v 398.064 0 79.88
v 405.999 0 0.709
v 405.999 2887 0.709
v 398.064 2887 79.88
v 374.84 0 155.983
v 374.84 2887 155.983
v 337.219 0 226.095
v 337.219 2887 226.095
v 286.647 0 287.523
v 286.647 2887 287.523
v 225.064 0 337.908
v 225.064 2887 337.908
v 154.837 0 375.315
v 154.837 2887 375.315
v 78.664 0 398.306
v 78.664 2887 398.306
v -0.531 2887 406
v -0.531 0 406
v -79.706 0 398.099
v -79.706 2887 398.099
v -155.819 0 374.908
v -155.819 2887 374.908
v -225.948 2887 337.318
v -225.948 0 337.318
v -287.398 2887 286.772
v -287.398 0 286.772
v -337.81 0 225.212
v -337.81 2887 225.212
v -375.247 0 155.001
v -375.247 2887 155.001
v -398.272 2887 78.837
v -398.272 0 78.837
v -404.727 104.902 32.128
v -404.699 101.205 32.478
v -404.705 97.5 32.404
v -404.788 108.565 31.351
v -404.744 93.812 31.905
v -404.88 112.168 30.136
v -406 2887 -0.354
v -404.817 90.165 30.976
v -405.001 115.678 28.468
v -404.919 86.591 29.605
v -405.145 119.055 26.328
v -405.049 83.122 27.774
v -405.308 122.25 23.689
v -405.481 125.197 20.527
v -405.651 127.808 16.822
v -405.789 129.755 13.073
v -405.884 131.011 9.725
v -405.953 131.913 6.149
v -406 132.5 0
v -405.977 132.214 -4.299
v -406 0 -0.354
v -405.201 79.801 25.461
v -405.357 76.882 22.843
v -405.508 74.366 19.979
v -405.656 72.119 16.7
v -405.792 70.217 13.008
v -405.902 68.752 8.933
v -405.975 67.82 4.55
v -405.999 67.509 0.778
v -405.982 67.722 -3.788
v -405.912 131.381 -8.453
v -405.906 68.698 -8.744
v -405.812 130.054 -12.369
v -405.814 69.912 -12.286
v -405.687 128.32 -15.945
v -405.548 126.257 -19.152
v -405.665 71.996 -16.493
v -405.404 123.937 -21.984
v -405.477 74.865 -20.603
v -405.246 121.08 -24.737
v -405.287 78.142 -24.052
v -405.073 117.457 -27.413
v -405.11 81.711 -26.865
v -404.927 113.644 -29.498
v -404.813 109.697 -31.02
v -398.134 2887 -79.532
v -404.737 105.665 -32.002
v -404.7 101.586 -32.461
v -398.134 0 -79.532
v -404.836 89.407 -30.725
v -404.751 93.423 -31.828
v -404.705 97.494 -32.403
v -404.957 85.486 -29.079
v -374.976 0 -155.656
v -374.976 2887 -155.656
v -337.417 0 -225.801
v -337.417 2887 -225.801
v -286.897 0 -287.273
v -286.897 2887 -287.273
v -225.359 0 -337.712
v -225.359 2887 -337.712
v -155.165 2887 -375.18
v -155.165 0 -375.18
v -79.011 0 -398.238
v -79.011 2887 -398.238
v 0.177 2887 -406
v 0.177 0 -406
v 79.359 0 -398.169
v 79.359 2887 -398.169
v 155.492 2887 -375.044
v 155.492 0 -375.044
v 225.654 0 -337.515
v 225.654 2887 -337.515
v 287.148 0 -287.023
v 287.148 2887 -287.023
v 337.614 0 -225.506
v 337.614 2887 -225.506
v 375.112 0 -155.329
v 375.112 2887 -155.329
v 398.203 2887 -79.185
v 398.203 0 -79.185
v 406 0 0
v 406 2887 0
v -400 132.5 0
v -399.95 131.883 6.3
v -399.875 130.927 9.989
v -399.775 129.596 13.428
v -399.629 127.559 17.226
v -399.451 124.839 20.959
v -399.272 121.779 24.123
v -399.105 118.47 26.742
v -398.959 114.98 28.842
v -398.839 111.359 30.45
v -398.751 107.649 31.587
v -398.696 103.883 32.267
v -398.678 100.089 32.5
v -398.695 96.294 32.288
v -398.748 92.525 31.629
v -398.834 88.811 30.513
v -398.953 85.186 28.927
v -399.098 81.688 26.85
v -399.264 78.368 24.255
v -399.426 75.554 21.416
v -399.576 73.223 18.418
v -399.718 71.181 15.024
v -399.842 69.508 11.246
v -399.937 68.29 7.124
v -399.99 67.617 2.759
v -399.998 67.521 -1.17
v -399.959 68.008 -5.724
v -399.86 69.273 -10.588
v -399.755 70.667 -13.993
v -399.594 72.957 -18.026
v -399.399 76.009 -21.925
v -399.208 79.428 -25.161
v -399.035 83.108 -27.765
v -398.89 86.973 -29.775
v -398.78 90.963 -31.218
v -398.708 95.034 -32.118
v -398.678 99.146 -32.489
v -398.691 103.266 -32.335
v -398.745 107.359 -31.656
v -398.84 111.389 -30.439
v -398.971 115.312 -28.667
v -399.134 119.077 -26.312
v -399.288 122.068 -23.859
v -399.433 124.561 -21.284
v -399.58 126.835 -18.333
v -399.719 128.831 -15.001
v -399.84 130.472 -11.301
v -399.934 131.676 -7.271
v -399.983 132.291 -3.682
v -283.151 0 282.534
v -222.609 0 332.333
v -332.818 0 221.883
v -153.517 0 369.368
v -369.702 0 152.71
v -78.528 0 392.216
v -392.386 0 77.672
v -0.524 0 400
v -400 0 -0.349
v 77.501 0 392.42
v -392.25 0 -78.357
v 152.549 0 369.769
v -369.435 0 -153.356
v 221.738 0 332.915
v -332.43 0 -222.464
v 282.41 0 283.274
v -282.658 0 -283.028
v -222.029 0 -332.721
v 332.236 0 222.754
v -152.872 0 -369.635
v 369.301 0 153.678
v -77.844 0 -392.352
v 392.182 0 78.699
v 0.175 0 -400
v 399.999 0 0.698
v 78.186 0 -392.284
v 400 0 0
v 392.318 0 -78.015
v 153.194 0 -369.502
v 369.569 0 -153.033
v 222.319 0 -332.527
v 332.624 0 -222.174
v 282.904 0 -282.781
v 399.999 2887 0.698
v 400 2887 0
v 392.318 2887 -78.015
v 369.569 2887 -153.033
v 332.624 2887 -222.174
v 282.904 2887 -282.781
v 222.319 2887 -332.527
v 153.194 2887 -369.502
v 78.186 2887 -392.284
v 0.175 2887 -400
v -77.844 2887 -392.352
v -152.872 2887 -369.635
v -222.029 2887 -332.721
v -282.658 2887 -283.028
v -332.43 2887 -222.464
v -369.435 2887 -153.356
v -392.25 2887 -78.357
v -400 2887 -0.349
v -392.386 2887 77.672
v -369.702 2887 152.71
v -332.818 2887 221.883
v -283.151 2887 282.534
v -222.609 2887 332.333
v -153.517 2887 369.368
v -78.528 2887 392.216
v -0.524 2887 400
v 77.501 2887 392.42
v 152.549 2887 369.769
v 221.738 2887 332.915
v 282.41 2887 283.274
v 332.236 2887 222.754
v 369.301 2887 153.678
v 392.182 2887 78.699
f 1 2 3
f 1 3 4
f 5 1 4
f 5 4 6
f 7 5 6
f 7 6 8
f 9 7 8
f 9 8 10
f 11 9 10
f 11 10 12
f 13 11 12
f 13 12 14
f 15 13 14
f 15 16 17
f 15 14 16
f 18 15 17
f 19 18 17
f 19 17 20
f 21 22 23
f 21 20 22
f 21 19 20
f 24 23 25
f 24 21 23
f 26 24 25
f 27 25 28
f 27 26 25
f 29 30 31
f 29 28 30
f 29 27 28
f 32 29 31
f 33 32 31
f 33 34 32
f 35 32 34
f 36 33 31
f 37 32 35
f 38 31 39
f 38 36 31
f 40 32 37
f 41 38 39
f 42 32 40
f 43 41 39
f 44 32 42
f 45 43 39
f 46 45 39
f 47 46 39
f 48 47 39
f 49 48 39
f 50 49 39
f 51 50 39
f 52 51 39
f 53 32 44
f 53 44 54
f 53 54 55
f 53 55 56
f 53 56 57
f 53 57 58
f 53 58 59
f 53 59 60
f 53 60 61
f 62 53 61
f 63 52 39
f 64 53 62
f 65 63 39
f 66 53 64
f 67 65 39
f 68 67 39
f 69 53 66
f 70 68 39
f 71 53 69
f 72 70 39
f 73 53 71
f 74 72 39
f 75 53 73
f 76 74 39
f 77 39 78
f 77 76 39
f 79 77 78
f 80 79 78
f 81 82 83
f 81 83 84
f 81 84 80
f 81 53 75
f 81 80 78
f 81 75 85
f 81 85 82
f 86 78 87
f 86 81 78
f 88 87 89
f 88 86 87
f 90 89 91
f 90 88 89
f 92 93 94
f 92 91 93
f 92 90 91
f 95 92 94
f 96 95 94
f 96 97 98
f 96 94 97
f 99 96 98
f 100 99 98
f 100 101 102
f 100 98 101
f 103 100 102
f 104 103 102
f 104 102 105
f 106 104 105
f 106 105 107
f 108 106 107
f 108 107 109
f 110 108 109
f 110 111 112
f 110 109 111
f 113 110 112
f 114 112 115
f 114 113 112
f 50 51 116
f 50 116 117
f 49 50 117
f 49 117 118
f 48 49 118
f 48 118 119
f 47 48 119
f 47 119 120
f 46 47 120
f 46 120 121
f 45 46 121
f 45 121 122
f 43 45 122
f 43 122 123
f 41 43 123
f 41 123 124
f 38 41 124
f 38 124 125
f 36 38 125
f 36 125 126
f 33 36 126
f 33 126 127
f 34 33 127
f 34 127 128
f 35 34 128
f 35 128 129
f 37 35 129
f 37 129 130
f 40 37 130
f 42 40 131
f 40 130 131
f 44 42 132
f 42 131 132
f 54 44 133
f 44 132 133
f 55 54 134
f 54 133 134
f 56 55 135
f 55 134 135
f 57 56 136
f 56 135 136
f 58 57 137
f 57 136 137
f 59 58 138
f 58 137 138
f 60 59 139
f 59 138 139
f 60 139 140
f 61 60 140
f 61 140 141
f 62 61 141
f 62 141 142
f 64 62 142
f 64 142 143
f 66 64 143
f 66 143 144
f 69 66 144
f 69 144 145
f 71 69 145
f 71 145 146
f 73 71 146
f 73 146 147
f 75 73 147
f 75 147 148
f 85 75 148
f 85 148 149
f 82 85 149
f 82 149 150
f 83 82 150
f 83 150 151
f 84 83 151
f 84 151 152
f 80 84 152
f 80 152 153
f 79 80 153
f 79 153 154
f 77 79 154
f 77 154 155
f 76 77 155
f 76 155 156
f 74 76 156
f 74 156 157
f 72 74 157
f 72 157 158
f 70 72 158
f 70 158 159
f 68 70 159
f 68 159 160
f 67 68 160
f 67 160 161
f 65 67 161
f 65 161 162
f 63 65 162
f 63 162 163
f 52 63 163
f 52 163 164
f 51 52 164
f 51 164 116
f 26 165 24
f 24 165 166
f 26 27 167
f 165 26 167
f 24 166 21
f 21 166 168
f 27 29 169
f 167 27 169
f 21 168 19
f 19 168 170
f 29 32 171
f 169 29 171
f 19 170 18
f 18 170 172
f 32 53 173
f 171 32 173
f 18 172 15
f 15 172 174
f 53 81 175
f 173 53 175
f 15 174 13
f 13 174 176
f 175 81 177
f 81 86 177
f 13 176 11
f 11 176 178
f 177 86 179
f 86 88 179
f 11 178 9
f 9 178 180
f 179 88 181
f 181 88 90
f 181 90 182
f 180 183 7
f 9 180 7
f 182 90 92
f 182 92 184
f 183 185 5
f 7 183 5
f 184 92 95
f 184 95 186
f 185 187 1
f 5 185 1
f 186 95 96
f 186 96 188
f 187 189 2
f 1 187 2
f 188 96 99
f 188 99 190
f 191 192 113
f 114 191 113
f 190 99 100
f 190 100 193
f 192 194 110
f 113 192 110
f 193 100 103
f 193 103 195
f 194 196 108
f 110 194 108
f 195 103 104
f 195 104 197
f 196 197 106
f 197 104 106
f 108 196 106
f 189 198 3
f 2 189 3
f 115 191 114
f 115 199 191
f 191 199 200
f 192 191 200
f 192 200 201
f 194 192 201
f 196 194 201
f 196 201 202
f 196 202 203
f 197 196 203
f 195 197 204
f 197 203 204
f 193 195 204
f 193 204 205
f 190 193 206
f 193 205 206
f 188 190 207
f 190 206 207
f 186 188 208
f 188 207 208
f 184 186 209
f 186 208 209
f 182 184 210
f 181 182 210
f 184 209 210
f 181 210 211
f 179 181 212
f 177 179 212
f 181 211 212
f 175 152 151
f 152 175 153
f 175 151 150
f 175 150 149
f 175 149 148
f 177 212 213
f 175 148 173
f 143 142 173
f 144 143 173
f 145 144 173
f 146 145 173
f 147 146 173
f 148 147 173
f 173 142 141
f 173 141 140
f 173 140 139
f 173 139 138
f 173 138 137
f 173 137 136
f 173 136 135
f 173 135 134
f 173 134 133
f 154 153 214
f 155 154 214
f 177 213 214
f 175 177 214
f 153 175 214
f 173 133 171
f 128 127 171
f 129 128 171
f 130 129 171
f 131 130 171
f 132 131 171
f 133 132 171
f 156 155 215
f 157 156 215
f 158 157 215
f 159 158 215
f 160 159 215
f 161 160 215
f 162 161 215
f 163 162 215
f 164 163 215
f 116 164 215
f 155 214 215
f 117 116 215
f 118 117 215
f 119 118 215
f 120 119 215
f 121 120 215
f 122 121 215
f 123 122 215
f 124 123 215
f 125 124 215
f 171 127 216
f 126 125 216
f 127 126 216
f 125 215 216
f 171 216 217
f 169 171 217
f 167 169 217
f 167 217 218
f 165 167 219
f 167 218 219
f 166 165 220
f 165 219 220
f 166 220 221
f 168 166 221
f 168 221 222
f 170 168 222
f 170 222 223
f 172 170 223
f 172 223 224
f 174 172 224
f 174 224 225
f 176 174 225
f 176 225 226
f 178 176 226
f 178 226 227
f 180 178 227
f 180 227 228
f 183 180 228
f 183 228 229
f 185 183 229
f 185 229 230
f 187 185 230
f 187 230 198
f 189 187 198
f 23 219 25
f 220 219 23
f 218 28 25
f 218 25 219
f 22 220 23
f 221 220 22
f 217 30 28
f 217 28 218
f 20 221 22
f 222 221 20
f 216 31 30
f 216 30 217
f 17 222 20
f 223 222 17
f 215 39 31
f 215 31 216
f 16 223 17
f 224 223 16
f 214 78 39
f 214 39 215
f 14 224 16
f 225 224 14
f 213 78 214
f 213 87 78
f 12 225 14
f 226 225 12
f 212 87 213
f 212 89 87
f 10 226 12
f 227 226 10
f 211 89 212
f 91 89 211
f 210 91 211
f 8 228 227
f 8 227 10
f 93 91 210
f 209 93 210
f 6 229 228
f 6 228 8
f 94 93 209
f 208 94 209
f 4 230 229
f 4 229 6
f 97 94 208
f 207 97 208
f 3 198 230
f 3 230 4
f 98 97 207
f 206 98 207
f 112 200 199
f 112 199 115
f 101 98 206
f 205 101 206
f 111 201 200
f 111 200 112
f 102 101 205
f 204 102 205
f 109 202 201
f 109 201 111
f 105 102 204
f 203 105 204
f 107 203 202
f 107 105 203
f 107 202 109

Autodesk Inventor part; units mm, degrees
ref_plane "YZ Plane" through (0, 0, 0) normal (1, 0, 0) x (0, 1, 0)
ref_plane "XZ Plane" through (0, 0, 0) normal (0, 1, 0) x (-1, 0, 0)
ref_plane "XY Plane" through (0, 0, 0) normal (0, 0, 1) x (1, 0, 0)
sketch "Sketch1" plane through (0, 0, 0) normal (0, 0, 1) x (1, 0, 0)
  line L0 (406, 0) -> (400, 0)
  line L1 (400, 0) -> (400, 2887)
  line L2 (400, 2887) -> (406, 2887)
  line L3 (406, 2887) -> (406, 0)
  line L4 (0, 0) -> (0, 2896.1409)
  point P0 (403, 0)
  dimension "d0" = 6
  dimension "d1" = 2887
  dimension "d2" = 400
revolve "Revolution1" add sketch "Sketch1" angle 359.9 about axis through (0, 0, 0) along (0, 1, 0)
sketch "Sketch2" plane through (0, 0, 0) normal (1, 0, 0) x (0, 1, 0)
  circle A0 centre (100, 0) radius 32.5
  point P0 (0, 0)
  dimension "d4" = 65
  dimension "d5" = 100
extrude "Extrusion1" cut sketch "Sketch2" against normal through all
equation "\"BendReliefWidth\" = Thickness"
equation "\"BendReliefDepth\" = 0.5 * Thickness"
equation "\"CornerReliefSize\" = 4 * Thickness"
equation "\"MinimumRemnant\" = 2 * Thickness"
equation "\"TransitionRadius\" = BendRadius"
equation "\"JacobiRadiusSize\" = BendRadius"
equation "\"GapSize\" = Thickness"
equation "\"Thickness\" = 6"
equation "\"BendRadius\" = 2.75"
properties part number "BSH 082 barrel wall" material "Stainless Steel"
